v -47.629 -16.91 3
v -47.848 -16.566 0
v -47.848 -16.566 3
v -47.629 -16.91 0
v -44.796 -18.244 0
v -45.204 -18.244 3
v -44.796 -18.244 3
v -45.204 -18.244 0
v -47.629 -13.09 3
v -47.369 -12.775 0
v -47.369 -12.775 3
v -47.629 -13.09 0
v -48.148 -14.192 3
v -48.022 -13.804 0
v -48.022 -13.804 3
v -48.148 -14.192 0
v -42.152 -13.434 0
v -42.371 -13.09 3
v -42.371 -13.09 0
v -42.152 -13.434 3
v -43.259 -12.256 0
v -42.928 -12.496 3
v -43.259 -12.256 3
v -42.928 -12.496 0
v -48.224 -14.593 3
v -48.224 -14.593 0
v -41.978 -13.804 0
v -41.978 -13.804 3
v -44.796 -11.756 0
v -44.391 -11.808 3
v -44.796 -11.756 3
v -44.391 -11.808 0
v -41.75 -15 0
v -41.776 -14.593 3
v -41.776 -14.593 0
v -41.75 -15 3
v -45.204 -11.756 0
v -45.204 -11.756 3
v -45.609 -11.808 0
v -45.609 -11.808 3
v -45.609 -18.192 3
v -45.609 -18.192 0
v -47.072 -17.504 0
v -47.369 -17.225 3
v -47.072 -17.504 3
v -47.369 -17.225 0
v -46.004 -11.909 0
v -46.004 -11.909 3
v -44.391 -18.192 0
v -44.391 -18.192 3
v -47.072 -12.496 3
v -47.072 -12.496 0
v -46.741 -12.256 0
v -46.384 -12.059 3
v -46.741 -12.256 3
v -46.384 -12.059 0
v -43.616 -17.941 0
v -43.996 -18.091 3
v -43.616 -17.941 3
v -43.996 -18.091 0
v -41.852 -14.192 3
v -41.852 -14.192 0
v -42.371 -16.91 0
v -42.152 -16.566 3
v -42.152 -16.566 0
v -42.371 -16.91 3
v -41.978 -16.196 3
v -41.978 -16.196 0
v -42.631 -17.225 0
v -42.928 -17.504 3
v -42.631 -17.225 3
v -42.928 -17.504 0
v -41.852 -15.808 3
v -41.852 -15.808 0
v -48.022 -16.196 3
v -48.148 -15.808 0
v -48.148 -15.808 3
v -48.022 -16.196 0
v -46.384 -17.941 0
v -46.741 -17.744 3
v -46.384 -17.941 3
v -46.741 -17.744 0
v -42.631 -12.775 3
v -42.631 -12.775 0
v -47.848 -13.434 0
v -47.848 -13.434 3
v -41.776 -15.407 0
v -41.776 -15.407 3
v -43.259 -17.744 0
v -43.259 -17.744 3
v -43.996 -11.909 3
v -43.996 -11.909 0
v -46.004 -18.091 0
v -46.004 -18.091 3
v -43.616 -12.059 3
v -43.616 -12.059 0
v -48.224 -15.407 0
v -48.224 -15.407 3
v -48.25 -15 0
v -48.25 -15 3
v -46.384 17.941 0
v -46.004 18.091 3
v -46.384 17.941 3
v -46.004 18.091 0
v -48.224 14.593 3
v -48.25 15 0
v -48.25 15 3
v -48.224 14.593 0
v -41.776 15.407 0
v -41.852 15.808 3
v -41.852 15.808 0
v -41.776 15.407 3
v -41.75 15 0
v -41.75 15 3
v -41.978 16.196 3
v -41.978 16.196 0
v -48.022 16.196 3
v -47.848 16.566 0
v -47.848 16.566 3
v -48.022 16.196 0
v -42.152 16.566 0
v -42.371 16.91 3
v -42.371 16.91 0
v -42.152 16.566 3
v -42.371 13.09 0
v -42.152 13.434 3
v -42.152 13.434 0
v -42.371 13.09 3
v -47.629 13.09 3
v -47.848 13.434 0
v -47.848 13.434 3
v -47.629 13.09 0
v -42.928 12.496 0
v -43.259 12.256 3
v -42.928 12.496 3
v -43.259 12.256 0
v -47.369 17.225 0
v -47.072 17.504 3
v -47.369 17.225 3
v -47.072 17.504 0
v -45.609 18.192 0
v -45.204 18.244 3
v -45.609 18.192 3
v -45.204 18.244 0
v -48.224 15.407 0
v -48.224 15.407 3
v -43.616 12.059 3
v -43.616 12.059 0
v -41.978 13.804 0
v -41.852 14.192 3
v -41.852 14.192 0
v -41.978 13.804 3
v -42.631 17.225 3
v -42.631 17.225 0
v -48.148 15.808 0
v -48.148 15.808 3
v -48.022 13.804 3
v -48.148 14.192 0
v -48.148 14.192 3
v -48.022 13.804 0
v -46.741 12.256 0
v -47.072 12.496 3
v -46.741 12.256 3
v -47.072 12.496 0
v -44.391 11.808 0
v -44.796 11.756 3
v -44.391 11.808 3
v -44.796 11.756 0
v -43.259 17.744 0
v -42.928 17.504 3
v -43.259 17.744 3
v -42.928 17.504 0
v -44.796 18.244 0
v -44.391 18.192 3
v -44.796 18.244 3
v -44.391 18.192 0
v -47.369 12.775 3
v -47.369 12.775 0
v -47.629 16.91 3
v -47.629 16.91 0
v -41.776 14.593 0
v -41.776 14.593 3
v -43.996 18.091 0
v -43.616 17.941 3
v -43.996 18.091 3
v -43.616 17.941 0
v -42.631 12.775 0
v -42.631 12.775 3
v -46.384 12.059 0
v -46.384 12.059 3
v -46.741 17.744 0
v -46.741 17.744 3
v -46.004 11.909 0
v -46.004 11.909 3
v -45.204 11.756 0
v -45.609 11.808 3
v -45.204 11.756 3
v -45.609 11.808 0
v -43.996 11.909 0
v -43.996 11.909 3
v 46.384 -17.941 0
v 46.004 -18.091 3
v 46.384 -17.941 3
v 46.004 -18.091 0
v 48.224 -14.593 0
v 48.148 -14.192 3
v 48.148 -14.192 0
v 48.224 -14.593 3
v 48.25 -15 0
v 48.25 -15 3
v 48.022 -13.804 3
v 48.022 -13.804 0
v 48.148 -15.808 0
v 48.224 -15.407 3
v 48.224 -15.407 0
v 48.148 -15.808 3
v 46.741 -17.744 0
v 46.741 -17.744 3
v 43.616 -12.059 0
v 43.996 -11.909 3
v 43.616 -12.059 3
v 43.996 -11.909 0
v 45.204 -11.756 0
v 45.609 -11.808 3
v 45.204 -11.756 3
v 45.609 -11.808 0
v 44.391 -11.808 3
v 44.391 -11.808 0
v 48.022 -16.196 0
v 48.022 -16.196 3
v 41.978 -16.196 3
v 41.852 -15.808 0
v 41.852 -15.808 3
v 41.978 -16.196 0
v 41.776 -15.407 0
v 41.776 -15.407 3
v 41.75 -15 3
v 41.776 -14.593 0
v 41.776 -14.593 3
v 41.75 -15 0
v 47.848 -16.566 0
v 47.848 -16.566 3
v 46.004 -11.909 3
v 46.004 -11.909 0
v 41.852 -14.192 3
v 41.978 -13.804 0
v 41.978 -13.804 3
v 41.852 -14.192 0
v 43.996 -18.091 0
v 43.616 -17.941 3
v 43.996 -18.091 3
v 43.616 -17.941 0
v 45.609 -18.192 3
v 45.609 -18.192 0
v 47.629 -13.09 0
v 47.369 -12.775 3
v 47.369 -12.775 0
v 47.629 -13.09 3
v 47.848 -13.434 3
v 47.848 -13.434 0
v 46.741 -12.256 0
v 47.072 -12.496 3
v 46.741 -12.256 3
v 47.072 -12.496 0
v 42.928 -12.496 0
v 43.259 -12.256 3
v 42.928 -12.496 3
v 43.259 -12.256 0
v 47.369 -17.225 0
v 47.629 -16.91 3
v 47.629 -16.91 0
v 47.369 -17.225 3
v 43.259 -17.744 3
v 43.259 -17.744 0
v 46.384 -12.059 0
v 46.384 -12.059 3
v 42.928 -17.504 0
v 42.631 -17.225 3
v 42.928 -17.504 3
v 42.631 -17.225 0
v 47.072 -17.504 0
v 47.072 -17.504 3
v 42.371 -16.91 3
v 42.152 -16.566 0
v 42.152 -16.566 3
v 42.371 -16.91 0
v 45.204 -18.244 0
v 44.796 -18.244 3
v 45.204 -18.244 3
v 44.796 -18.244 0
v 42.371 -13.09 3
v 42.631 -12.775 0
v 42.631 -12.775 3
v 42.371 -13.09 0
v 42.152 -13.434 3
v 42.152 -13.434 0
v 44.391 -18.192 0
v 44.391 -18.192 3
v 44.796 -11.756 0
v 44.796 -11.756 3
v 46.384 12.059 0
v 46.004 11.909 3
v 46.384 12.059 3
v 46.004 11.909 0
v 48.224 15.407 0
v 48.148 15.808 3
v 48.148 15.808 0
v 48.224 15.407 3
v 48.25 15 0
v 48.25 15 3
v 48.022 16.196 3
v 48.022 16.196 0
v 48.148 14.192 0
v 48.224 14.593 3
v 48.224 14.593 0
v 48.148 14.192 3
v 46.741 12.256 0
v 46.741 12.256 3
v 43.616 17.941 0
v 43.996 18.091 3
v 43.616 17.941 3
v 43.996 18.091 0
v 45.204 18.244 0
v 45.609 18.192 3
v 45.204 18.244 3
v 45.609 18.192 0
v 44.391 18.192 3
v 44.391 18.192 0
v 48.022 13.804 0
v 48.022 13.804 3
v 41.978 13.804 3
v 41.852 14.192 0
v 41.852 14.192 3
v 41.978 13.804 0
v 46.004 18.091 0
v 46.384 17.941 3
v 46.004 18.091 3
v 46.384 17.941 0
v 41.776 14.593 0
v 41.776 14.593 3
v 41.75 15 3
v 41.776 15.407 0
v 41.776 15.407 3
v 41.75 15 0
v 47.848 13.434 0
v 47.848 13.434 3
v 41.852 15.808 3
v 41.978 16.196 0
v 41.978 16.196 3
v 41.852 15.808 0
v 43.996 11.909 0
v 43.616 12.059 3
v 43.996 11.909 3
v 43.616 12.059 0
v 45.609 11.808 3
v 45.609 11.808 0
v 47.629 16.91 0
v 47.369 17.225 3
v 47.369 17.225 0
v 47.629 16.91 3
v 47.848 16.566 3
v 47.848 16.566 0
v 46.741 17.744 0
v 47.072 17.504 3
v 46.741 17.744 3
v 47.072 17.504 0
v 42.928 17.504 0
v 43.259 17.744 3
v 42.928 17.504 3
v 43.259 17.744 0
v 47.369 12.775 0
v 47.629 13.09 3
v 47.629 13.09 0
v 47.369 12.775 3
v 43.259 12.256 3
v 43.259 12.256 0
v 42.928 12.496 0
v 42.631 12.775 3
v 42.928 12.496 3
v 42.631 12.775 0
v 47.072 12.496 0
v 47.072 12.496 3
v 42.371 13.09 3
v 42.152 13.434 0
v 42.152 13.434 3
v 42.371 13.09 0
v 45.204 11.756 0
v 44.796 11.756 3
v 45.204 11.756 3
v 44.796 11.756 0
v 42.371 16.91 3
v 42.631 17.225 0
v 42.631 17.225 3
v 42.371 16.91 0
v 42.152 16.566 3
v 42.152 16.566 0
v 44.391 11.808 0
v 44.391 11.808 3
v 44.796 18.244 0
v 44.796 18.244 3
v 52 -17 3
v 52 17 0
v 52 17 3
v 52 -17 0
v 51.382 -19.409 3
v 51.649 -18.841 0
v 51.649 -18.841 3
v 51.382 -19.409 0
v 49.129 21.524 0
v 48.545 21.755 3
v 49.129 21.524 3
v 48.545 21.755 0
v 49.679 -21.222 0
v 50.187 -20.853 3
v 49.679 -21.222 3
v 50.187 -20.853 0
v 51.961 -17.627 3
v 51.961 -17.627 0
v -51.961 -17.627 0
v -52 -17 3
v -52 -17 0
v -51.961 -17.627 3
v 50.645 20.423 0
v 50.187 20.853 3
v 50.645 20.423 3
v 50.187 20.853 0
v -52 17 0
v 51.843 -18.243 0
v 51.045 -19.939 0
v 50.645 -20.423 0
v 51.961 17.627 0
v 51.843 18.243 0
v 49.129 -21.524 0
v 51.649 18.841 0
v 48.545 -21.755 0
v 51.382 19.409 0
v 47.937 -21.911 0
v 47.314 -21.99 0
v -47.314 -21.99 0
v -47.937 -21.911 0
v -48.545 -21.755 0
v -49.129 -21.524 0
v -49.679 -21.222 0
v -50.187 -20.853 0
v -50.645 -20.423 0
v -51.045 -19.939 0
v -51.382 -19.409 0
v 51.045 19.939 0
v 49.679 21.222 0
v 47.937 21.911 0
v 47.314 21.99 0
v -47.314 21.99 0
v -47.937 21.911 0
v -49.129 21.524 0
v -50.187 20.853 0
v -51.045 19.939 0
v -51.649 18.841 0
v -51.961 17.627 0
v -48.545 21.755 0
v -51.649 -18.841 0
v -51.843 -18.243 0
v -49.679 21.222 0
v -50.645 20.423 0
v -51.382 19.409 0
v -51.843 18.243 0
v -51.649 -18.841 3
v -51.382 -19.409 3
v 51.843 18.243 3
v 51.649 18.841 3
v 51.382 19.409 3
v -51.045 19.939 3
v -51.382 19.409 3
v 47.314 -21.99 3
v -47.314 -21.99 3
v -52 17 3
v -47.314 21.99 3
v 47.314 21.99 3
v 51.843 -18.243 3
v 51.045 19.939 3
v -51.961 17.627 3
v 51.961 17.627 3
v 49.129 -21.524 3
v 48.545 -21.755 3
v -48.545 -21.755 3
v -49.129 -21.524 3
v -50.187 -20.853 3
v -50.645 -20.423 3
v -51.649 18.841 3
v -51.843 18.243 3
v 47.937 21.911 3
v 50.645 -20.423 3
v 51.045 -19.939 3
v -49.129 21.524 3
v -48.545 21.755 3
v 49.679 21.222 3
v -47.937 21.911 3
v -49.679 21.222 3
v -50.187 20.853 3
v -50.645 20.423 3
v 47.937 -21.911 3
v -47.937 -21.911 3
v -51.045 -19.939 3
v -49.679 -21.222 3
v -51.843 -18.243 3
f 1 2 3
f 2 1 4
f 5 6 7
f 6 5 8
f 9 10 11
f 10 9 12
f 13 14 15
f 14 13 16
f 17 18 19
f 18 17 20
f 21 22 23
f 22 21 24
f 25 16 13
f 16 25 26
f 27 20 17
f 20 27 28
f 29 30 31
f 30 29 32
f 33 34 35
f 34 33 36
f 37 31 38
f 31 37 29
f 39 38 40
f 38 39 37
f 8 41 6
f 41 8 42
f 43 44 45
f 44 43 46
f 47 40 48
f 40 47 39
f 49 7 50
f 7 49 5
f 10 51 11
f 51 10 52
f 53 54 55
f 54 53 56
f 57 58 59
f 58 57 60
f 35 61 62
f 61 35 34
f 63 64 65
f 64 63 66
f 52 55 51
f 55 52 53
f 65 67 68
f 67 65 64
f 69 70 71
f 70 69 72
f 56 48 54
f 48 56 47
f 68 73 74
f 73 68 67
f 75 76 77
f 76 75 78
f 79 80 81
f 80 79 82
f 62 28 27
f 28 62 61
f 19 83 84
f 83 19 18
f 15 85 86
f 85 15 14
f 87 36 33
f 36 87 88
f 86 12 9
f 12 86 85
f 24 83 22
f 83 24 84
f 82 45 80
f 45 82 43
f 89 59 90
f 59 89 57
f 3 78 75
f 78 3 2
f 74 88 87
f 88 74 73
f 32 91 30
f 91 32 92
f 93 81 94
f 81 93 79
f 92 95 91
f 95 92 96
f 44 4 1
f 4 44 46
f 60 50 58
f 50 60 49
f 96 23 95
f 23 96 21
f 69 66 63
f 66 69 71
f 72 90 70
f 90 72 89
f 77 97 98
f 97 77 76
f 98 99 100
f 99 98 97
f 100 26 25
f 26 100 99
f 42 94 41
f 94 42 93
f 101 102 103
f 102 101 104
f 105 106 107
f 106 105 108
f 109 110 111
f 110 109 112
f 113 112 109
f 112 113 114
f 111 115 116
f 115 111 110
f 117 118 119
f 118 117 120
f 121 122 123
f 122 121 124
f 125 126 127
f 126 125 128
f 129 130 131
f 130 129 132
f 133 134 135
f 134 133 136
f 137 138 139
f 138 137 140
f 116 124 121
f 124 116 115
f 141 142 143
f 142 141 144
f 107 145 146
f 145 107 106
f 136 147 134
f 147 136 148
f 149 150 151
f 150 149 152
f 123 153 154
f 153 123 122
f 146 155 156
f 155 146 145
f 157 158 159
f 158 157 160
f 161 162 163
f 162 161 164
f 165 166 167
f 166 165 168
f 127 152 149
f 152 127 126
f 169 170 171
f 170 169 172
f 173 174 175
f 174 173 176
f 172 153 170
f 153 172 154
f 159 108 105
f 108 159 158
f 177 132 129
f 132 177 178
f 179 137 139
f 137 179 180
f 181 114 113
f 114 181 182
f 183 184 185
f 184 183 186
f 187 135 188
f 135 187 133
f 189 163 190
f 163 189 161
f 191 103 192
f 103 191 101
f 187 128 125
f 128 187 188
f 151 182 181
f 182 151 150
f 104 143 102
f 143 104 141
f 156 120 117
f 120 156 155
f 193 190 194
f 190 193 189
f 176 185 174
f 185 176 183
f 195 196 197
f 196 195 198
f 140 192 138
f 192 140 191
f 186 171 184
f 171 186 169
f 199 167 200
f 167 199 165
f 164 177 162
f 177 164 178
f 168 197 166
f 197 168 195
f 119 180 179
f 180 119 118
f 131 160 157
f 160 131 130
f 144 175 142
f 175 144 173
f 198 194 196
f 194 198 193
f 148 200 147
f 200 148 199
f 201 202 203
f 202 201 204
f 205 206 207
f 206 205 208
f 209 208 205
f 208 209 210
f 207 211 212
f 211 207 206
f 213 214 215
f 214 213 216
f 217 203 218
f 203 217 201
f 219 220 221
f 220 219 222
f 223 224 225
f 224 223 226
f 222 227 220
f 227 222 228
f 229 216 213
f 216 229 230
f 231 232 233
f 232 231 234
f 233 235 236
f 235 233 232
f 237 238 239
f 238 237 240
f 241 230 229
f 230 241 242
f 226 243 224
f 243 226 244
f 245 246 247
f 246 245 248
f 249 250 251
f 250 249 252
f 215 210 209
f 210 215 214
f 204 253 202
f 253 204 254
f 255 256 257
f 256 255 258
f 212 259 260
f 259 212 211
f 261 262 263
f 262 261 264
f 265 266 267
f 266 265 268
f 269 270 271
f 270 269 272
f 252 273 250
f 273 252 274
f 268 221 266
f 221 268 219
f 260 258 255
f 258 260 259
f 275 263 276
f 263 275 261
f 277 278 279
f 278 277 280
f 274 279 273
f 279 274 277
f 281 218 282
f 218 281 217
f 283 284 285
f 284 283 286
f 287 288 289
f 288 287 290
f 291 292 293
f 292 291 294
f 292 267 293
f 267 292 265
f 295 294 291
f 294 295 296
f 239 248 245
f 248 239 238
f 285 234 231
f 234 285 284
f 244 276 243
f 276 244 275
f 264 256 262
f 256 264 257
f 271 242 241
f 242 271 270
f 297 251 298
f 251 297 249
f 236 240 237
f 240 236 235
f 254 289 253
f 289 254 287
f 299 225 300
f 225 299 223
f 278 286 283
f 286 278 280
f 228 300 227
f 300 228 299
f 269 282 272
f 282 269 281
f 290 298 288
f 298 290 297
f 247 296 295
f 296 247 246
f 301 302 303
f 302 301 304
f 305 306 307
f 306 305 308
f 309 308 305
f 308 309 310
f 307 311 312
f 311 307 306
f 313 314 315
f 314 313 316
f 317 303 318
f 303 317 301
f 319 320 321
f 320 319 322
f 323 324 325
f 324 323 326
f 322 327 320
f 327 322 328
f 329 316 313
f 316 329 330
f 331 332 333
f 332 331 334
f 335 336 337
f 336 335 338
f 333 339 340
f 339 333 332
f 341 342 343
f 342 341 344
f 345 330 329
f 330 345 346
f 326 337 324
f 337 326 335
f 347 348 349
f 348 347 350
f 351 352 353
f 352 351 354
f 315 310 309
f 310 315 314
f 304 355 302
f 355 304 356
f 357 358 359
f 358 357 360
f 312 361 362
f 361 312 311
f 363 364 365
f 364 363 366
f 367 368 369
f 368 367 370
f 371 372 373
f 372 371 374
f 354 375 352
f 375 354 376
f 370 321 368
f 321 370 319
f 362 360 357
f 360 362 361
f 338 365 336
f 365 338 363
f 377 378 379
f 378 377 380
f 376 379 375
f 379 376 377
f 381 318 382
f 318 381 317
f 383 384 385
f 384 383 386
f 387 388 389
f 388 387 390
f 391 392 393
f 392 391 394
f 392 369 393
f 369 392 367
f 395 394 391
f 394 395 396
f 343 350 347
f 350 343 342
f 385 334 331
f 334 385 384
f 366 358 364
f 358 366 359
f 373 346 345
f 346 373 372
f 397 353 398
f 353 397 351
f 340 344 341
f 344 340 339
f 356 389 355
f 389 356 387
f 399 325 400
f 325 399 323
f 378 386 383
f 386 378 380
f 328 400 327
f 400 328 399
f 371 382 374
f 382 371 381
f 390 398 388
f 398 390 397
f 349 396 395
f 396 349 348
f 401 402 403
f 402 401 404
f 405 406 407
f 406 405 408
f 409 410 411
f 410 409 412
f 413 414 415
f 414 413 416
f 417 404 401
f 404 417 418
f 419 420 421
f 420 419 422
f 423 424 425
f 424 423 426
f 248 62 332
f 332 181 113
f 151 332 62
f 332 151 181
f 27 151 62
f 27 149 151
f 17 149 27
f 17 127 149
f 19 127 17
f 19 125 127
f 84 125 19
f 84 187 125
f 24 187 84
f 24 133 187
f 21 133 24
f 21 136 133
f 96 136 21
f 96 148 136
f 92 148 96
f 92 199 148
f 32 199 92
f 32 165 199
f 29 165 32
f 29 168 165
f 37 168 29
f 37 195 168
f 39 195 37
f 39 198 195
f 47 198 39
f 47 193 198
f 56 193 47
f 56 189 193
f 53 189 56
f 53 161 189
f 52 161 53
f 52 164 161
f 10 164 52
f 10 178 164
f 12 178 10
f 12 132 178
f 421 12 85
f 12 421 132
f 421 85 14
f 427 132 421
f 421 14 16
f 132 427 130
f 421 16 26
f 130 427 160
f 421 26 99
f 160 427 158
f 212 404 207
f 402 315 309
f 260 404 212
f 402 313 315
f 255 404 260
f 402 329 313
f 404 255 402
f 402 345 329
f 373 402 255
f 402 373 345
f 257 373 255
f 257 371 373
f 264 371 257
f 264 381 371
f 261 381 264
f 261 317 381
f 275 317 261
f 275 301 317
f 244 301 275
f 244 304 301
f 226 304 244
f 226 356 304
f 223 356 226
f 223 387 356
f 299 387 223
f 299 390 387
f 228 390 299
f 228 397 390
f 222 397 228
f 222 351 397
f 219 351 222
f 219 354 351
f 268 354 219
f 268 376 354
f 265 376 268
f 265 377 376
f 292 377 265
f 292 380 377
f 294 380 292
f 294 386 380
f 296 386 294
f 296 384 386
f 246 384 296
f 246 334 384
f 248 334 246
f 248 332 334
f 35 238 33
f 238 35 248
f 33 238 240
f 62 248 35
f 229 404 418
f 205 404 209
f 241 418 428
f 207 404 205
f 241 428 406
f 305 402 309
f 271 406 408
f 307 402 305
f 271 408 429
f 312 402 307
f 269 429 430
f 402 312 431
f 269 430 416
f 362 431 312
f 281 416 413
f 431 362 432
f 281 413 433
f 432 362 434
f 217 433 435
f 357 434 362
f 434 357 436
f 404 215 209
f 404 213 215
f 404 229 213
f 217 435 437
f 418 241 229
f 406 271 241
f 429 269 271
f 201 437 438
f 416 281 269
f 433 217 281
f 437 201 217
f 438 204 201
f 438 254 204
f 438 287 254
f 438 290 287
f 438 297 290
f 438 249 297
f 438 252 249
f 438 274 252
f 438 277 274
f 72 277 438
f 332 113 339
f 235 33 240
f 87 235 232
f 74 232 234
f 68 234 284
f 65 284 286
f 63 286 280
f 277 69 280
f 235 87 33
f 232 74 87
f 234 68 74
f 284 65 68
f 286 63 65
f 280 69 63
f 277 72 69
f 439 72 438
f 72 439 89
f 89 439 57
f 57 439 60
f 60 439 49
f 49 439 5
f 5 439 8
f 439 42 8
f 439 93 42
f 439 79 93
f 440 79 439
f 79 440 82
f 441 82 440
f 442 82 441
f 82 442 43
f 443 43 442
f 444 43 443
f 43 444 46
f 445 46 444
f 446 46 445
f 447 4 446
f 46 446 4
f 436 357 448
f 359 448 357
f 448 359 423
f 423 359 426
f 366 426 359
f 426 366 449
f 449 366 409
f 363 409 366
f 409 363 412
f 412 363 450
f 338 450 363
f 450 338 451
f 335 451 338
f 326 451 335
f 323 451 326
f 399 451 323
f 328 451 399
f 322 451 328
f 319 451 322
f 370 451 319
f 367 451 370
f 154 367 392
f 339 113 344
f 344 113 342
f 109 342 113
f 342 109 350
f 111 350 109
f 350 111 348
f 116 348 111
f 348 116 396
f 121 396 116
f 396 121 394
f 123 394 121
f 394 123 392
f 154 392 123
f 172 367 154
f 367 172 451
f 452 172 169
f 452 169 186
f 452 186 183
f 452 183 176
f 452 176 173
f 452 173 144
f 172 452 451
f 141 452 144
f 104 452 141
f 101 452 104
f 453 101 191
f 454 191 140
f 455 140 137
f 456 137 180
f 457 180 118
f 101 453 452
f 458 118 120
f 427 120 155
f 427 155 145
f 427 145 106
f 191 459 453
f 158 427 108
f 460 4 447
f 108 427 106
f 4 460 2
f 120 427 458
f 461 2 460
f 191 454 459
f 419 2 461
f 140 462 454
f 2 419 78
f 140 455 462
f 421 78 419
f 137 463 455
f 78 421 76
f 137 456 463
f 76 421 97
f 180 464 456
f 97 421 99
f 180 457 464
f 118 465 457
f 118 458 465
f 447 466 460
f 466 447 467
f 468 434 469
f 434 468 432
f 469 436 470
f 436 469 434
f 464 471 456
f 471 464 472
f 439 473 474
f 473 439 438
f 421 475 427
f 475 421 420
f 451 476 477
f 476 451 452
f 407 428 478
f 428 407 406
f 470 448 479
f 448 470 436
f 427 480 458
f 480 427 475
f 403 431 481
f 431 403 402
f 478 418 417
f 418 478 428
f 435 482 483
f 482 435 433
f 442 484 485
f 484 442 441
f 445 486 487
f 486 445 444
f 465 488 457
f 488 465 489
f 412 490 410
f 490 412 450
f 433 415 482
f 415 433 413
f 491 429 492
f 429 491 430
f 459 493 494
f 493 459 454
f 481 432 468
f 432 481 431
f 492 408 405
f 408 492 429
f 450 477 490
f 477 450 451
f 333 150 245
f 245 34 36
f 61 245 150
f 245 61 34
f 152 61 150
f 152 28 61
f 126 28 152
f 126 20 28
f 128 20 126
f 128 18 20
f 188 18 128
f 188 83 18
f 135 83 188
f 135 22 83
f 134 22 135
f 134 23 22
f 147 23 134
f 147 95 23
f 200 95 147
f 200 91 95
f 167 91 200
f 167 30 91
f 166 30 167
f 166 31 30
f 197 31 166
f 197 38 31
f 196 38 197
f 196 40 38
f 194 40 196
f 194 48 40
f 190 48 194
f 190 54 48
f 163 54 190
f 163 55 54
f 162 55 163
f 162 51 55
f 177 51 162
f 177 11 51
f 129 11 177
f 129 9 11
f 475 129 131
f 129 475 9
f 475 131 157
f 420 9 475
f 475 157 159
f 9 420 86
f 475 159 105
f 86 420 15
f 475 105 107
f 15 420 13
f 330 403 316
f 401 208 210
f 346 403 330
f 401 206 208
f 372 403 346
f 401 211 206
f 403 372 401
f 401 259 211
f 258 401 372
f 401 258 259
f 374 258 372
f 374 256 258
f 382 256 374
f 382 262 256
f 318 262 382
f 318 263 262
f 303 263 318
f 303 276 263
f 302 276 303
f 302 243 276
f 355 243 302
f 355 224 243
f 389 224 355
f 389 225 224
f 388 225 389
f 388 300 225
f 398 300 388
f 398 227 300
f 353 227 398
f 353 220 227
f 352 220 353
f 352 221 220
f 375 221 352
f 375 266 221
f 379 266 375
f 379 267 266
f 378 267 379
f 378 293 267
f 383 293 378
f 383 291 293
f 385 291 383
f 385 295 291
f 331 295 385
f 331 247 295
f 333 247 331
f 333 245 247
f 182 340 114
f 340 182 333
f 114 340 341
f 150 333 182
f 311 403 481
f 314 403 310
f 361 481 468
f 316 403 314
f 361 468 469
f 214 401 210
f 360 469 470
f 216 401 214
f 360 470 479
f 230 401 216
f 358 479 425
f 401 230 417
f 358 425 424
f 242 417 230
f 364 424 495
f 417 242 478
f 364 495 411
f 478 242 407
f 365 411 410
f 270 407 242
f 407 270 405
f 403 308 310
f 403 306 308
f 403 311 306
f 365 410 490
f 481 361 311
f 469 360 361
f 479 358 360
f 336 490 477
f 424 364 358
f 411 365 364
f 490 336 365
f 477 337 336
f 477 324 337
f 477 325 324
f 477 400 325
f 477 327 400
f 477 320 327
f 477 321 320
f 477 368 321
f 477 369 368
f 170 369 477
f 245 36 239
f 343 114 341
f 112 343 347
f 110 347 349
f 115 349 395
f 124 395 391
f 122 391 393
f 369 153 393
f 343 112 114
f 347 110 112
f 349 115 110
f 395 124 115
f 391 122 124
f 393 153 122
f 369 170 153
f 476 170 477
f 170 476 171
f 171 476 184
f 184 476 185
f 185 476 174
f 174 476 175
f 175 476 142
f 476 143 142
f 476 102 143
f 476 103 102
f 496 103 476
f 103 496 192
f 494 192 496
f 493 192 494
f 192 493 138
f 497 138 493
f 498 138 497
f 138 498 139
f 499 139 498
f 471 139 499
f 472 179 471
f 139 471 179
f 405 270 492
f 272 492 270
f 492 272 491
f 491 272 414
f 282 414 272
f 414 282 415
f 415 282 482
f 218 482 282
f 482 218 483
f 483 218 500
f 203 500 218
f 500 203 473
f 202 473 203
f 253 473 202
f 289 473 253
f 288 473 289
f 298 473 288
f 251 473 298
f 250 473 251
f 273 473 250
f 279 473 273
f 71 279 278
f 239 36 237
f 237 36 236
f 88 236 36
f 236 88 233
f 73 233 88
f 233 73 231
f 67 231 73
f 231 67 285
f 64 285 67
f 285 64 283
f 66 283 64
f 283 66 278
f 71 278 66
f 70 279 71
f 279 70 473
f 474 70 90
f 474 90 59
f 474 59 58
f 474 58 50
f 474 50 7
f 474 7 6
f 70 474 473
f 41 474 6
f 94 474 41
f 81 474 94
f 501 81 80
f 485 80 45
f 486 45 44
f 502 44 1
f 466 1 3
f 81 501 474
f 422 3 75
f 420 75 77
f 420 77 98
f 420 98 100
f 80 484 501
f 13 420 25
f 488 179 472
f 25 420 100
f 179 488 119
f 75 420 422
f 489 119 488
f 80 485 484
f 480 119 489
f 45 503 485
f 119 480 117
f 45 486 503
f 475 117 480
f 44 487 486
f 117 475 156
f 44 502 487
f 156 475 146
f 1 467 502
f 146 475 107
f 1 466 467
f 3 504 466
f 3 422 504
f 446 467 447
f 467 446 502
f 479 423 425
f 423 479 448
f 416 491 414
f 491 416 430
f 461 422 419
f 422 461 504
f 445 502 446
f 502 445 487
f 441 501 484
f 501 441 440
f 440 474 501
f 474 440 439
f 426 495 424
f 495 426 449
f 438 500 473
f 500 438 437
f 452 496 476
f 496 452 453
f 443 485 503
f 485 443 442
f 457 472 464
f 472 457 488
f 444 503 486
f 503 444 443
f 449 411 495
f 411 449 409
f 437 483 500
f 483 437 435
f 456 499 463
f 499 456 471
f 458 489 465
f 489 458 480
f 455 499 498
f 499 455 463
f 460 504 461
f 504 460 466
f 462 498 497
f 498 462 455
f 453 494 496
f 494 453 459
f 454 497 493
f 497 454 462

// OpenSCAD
$fn = 50;


difference() {
	union() {
		hull() {
			translate(v = [-47.0000000000, 17.0000000000, 0]) {
				cylinder(h = 3, r = 5);
			}
			translate(v = [47.0000000000, 17.0000000000, 0]) {
				cylinder(h = 3, r = 5);
			}
			translate(v = [-47.0000000000, -17.0000000000, 0]) {
				cylinder(h = 3, r = 5);
			}
			translate(v = [47.0000000000, -17.0000000000, 0]) {
				cylinder(h = 3, r = 5);
			}
		}
	}
	union() {
		translate(v = [-45.0000000000, -15.0000000000, -100.0000000000]) {
			cylinder(h = 200, r = 3.2500000000);
		}
		translate(v = [-45.0000000000, 15.0000000000, -100.0000000000]) {
			cylinder(h = 200, r = 3.2500000000);
		}
		translate(v = [45.0000000000, -15.0000000000, -100.0000000000]) {
			cylinder(h = 200, r = 3.2500000000);
		}
		translate(v = [45.0000000000, 15.0000000000, -100.0000000000]) {
			cylinder(h = 200, r = 3.2500000000);
		}
	}
}
